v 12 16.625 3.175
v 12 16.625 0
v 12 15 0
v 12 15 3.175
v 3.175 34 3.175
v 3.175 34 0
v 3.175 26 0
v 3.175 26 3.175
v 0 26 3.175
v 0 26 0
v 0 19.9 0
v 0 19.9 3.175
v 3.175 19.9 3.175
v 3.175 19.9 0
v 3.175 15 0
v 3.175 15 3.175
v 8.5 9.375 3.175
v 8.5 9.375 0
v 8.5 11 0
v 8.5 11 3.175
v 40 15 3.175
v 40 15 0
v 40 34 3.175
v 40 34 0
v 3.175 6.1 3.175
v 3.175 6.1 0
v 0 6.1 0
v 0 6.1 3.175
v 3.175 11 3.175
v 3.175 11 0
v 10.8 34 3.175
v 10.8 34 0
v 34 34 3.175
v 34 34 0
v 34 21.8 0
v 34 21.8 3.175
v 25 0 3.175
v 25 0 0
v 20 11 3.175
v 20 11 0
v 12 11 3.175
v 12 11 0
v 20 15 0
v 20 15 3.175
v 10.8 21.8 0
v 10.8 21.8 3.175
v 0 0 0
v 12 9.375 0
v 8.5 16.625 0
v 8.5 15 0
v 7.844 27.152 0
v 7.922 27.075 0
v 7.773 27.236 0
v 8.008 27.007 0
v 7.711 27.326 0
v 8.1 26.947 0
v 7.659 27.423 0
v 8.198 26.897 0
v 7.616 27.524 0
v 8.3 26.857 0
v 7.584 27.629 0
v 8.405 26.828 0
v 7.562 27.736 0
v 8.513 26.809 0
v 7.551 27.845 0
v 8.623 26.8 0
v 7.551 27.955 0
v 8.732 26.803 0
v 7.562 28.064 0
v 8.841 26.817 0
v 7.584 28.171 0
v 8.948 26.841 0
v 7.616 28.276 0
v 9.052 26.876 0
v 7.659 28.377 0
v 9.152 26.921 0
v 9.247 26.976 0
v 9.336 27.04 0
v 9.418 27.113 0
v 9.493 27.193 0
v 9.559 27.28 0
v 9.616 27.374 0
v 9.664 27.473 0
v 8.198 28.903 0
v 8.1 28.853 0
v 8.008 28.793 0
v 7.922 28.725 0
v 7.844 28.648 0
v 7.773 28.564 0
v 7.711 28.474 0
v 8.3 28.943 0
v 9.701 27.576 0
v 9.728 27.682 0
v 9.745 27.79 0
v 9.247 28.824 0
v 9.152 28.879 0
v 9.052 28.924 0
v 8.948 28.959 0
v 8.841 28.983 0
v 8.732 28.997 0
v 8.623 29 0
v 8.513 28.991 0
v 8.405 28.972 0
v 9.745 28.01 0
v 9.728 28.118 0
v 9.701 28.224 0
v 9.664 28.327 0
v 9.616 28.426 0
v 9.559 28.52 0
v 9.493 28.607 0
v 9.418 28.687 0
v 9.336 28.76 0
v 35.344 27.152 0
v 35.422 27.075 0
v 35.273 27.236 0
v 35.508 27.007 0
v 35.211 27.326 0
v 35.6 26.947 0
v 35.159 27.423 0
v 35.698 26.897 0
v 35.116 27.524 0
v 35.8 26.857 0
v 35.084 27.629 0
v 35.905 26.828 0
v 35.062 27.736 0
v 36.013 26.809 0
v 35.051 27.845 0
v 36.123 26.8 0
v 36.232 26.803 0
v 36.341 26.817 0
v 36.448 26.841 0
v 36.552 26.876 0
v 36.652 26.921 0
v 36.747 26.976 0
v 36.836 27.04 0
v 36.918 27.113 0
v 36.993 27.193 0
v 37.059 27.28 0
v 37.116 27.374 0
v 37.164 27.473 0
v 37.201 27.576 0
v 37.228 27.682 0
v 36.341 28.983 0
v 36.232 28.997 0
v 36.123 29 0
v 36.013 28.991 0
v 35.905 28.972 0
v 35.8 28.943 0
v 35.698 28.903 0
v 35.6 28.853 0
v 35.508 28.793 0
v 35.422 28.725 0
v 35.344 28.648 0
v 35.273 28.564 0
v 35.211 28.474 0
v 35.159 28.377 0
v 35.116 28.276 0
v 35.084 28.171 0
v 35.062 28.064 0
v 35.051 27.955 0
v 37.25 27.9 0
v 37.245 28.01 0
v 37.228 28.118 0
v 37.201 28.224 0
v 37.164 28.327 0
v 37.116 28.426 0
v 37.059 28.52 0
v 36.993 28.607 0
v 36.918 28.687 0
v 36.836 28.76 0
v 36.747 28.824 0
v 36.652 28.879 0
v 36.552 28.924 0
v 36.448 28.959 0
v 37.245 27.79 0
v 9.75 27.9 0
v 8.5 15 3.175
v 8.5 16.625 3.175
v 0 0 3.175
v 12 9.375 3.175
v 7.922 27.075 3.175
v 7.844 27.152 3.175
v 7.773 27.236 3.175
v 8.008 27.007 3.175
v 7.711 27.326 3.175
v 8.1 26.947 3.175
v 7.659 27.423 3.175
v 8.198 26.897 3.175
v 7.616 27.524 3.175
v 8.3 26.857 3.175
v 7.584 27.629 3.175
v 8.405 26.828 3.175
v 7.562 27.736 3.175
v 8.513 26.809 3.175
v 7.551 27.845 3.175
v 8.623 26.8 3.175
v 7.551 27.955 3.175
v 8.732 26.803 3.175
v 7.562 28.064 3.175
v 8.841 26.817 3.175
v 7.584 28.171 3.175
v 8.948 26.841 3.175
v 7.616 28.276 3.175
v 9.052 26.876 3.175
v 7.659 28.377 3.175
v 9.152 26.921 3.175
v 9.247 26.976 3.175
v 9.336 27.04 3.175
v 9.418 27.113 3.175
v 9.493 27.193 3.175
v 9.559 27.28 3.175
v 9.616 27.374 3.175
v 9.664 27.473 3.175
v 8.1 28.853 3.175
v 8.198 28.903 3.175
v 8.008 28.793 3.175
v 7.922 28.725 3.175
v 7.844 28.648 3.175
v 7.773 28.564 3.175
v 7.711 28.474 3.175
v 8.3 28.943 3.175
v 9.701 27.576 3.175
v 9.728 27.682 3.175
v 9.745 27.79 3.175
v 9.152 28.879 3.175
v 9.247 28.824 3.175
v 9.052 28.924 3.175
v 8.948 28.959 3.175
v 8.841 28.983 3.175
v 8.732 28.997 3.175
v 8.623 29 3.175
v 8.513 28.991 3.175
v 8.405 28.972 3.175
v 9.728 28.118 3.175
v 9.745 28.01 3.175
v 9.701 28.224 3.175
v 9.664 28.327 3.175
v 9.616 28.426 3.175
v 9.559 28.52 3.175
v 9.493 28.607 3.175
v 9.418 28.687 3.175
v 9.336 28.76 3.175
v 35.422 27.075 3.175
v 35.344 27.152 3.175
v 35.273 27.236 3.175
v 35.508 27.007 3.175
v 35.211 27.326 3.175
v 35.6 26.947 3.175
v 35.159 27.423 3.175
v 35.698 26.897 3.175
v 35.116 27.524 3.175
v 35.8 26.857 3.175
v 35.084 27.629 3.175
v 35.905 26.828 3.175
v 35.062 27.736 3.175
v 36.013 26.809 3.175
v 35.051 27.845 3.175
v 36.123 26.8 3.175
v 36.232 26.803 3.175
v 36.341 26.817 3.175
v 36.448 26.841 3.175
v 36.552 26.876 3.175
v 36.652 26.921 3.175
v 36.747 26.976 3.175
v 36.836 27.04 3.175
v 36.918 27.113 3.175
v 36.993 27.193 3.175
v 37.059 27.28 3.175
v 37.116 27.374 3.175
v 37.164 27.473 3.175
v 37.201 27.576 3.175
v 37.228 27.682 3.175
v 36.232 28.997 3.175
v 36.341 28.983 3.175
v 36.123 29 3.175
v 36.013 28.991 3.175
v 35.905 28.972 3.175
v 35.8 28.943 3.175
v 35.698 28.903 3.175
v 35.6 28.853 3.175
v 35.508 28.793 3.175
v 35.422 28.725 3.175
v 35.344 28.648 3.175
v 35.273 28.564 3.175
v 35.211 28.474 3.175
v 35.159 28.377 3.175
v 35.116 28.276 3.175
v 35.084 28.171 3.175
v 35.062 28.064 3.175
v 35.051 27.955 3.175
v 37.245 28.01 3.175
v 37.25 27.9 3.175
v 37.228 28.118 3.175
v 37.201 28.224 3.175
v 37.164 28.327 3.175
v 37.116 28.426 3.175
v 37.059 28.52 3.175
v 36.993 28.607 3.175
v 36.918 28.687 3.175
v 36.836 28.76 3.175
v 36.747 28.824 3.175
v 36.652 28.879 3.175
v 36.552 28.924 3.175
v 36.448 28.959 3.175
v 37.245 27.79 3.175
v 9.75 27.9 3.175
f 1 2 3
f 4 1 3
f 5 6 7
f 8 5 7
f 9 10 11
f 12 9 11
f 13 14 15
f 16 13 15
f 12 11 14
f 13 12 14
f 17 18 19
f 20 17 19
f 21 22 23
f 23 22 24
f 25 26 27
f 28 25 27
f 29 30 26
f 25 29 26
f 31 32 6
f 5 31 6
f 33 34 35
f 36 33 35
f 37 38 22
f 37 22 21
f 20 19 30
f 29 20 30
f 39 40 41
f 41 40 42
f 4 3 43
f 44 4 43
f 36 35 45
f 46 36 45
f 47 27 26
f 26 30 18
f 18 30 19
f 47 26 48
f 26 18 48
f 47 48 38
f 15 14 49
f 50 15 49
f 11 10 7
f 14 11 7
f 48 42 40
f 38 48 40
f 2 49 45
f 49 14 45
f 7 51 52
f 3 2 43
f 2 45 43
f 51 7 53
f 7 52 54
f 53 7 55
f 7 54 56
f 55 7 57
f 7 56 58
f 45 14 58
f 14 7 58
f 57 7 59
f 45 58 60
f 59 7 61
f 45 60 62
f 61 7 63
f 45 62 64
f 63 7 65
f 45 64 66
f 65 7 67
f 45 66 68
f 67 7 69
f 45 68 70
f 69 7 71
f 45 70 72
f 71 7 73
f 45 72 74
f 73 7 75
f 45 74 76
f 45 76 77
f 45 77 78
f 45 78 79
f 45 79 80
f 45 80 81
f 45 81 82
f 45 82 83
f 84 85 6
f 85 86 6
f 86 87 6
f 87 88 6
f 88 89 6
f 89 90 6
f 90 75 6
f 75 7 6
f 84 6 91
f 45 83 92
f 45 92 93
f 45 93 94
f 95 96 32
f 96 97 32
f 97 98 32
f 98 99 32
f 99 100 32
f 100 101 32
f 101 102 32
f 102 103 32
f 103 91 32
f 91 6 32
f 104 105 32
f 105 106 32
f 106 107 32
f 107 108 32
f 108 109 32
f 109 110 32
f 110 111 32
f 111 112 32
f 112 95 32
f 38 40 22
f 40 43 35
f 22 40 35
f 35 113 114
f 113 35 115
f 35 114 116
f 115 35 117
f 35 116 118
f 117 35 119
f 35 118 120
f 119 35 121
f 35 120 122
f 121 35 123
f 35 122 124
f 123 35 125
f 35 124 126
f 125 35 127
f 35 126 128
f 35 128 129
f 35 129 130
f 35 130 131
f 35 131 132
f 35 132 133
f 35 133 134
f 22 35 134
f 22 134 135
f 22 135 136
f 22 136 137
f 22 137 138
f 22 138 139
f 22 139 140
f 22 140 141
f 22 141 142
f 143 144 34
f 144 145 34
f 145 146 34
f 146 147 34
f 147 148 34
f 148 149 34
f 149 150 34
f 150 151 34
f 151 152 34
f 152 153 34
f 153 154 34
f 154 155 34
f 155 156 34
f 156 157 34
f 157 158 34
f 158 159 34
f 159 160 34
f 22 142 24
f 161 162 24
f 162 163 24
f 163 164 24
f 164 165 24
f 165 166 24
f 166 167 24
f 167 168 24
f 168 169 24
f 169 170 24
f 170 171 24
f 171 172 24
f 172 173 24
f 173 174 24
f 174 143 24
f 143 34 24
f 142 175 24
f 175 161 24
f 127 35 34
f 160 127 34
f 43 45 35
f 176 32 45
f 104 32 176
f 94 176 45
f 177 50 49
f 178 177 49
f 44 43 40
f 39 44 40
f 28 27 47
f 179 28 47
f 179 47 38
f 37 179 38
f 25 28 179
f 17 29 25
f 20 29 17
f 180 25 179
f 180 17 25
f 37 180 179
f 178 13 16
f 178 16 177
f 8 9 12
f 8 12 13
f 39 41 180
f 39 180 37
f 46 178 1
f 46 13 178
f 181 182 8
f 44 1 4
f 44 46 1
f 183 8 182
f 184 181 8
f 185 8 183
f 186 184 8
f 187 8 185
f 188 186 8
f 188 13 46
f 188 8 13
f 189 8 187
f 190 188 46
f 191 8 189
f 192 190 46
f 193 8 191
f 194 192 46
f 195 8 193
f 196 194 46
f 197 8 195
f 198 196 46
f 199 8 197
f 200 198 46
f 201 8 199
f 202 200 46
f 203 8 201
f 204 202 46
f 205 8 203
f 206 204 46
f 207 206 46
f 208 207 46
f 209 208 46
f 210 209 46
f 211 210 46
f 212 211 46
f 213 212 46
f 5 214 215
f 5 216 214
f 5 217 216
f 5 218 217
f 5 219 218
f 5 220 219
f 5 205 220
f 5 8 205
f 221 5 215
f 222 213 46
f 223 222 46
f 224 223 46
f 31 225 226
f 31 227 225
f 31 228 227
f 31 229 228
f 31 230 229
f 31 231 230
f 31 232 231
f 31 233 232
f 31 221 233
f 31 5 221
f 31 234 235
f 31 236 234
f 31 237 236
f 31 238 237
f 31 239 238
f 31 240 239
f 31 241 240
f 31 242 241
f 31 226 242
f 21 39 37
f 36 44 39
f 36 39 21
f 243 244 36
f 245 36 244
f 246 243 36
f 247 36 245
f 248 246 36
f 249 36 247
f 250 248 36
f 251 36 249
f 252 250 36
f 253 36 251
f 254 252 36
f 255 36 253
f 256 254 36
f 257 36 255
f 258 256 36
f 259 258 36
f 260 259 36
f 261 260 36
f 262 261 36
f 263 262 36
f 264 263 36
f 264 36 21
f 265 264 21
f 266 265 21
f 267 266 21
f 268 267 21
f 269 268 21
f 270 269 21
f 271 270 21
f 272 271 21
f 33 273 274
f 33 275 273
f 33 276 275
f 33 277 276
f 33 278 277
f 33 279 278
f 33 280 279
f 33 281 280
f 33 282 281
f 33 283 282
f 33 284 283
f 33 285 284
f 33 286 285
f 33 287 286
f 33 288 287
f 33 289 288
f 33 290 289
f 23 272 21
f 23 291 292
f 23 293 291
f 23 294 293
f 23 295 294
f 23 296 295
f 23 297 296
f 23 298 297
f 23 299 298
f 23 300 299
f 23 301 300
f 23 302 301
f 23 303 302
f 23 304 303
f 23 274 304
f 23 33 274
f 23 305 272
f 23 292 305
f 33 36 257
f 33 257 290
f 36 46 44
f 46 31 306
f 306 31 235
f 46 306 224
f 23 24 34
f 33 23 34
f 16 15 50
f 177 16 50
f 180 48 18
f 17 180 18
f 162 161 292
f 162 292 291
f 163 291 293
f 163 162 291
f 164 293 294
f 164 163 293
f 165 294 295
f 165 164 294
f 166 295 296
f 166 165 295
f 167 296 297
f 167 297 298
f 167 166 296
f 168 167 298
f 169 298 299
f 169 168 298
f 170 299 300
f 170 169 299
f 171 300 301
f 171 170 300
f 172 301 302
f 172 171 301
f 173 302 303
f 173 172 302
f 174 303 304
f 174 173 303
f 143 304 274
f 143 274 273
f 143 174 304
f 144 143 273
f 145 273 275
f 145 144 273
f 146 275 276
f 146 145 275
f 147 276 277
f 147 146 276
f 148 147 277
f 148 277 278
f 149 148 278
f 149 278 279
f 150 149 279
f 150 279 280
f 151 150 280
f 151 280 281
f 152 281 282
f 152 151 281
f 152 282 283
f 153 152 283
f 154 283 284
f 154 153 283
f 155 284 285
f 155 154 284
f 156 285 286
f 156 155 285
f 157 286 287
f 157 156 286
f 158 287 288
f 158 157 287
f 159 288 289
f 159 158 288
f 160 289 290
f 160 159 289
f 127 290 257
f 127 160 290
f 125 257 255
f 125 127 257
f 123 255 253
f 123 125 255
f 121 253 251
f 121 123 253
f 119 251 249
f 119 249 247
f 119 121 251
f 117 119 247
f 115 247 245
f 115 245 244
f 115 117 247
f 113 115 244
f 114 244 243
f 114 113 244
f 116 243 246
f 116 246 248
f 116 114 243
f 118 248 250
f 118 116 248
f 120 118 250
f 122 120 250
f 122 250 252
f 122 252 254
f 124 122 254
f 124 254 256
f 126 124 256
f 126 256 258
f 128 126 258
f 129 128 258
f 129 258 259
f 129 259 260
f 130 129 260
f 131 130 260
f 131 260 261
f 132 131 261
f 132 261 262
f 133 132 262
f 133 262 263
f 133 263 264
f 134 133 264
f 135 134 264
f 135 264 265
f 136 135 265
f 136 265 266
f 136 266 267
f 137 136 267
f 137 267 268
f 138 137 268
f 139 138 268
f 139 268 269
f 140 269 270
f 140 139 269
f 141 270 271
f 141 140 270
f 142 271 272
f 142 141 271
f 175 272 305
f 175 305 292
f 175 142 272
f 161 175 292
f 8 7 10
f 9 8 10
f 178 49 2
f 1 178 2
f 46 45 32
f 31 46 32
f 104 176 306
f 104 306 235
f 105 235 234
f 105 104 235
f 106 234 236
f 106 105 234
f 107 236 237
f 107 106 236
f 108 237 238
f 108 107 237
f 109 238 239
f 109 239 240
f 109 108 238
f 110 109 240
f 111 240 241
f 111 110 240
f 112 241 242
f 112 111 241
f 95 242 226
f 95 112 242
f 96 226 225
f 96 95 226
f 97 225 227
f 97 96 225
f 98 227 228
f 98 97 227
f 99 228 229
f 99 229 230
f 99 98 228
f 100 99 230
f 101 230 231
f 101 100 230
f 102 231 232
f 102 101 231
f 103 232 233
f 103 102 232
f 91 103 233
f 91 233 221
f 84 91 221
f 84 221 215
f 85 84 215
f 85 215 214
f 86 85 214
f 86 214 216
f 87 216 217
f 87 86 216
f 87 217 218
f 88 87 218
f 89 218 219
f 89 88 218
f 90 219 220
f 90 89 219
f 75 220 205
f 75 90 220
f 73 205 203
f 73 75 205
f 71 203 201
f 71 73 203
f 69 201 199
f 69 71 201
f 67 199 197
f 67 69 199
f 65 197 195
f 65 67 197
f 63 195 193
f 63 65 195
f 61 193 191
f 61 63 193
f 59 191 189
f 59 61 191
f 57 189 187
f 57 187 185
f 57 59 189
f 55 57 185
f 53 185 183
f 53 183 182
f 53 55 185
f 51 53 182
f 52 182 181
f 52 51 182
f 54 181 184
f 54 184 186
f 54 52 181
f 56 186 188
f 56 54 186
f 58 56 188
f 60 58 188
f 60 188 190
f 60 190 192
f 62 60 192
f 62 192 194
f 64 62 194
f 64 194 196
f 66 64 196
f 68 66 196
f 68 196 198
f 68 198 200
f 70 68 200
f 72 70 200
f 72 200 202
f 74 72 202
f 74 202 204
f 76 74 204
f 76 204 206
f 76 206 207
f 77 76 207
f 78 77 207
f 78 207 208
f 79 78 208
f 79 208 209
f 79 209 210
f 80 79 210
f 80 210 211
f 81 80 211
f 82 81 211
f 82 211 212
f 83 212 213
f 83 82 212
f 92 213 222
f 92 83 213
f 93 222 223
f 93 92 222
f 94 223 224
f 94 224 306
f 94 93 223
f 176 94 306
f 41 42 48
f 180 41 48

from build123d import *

# Parameters (mm, degrees)
SKETCH1_R           = 1.1
BOSS_EXTRUDE1_DEPTH = 3.175
CHAMFER1_SIZE       = 15


with BuildPart() as part:
    # Sketch1 → Boss-Extrude1 (new body)
    # profile 1 of 2: a face of its own
    with BuildSketch(Plane.XY):
        Polygon((10.8, 21.8), (10.8, 34), (3.175, 34), (3.175, 26), (0, 26), (0, 19.9), (3.175, 19.9), (3.175, 17), (40, 17), (40, 34), (34, 34), (34, 21.8), align=None)
        with Locations((8.65, 27.9)):
            Circle(SKETCH1_R, mode=Mode.SUBTRACT)
        with Locations((36.15, 27.9)):
            Circle(SKETCH1_R, mode=Mode.SUBTRACT)
    # profile 2 of 2: a face of its own
    with BuildSketch(Plane.XY):
        Polygon((40, 0), (40, 17), (3.175, 17), (3.175, 15), (8.5, 15), (8.5, 16.625), (12, 16.625), (12, 15), (20, 15), (20, 11), (12, 11), (12, 9.375), (8.5, 9.375), (8.5, 11), (3.175, 11), (3.175, 6.1), (0, 6.1), (0, 0), align=None)
    extrude(amount=BOSS_EXTRUDE1_DEPTH)

    # Chamfer1
    chamfer1_edges = [part.edges().sort_by_distance(p)[0] for p in [
        (40, 0, 1.5875),
    ]]
    chamfer(chamfer1_edges, length=CHAMFER1_SIZE)


solid = part.part
